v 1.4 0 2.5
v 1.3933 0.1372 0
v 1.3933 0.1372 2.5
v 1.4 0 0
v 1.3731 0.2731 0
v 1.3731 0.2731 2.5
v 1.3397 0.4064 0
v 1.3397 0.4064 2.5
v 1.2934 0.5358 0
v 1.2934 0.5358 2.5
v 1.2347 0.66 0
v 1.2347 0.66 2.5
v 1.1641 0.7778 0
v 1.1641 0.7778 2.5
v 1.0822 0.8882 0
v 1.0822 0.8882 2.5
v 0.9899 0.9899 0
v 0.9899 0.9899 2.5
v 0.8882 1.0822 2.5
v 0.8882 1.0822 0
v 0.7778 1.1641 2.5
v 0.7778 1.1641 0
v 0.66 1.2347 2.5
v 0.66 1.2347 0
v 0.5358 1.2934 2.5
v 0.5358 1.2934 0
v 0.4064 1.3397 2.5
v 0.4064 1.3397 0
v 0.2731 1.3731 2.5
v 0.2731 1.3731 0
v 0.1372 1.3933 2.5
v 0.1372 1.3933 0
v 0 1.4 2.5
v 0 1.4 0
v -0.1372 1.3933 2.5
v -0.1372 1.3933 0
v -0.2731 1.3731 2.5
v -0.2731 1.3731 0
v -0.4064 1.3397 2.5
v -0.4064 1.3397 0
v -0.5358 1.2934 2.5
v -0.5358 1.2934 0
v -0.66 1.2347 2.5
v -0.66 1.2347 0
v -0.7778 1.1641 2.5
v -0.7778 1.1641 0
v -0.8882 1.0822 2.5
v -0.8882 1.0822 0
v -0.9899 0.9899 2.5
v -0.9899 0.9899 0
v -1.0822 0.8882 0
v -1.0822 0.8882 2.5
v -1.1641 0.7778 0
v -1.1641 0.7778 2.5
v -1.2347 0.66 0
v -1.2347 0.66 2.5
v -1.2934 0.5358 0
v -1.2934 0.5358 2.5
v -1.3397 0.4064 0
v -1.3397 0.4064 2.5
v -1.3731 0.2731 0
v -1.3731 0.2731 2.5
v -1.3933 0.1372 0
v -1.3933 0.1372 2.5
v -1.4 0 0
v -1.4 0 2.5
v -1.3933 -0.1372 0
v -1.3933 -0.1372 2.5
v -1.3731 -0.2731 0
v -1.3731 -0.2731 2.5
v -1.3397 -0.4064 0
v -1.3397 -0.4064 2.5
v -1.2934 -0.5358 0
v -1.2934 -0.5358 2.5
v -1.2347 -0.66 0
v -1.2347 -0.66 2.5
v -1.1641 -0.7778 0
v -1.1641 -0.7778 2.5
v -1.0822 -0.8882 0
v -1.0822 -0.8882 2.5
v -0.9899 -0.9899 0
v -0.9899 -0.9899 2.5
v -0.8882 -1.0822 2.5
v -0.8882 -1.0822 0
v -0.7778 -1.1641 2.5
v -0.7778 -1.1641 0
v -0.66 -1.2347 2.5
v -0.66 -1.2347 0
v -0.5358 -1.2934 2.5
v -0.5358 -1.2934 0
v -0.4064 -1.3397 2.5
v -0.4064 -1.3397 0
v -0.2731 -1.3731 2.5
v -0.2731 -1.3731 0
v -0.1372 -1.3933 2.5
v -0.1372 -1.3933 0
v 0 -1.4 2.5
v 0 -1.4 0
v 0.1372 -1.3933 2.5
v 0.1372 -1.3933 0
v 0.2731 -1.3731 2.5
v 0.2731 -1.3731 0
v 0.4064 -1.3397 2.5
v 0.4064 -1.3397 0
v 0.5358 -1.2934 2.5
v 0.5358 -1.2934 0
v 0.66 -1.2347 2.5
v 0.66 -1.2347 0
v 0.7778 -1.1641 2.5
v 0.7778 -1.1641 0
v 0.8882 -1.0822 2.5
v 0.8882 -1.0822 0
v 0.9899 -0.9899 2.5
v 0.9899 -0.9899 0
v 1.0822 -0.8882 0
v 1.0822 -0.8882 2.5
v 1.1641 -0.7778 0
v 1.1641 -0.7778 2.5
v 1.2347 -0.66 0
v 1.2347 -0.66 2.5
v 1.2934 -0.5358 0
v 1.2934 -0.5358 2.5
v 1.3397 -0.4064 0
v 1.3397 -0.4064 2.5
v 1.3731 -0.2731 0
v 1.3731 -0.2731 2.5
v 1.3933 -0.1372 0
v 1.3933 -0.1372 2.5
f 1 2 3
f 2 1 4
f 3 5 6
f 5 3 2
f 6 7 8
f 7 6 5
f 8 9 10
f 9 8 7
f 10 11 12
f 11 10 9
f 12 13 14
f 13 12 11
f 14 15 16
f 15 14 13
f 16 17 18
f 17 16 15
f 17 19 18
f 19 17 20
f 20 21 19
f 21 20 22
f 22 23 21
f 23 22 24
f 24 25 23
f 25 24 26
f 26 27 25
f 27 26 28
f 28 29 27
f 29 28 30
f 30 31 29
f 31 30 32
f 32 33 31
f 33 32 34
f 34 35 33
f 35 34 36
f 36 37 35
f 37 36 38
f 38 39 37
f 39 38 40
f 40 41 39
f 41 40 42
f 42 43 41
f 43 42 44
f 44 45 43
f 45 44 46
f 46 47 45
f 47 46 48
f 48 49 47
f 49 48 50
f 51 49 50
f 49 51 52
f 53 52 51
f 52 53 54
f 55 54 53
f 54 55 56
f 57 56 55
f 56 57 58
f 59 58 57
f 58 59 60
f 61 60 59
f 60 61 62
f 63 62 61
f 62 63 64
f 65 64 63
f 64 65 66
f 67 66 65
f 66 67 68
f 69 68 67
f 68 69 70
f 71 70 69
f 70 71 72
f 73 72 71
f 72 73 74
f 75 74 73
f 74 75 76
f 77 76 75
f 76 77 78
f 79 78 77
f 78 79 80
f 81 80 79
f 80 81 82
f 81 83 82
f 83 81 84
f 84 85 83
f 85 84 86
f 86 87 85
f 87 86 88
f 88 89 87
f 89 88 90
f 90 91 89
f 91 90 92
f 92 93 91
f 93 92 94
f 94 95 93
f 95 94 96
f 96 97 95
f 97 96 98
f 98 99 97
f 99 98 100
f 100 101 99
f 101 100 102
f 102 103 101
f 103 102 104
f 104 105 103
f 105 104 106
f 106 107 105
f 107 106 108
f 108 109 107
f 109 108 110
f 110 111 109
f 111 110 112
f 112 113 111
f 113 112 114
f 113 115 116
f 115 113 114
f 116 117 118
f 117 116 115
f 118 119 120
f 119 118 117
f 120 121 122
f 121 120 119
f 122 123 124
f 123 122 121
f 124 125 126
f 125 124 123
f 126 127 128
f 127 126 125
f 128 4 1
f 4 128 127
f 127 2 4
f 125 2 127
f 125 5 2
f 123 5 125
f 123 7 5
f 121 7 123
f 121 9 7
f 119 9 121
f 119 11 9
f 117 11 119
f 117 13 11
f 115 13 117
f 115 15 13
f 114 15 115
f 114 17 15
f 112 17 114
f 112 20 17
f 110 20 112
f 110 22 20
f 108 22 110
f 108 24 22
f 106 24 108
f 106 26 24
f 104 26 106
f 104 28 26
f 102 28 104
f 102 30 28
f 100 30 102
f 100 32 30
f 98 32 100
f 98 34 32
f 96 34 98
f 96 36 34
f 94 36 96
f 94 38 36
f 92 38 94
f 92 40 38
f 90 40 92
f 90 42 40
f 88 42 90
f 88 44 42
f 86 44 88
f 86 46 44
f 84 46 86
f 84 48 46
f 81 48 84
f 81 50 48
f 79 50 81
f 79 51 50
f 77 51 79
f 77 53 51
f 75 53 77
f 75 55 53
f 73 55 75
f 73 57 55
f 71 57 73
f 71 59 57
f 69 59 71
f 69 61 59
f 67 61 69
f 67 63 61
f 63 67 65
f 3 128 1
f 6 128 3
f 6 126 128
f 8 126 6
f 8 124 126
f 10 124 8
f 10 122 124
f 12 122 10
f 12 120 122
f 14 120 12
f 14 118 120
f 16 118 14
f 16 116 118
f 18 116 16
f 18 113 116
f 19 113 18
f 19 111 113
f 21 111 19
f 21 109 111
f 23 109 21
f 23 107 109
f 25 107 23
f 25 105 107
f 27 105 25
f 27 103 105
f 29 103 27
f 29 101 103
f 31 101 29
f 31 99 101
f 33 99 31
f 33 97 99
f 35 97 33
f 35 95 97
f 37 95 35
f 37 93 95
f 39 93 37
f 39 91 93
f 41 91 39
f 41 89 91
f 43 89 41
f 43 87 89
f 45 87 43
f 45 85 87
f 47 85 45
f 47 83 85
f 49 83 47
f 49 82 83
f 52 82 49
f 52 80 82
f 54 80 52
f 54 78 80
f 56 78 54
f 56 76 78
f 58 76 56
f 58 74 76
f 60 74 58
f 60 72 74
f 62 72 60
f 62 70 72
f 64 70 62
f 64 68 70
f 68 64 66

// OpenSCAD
// difference() {
//   intersection() {
//     import("MainBody1_fixed.stl");
//     //translate([0,-10,-80]) cube([45,16.5,80]);
//    //   translate([0,-10,-65]) cube([45,16.5,50]);
//   }
//   translate([33,-2.5,-60]) cube([10,5,28]);
//   translate([20,-3.5,-42]) cube([15,5,10]);
//   translate([18,-3.5,-43]) rotate([0,30,0]) cube([20,5,10]);
//   translate([6.5,-1,-38]) {
//     cube([15.5,20,12]);
//     translate([7.75,0,0]) rotate([-90,0,0]) cylinder(r=7.75,h=20);
//   }
// }
// translate([13.7,0,-31.2]) rotate([-90,0,0]) translate([11.6,12,0]) cylinder(r=1.4,h=5,$fn=64);
// translate([26,0,-44]) rotate([-90,0,0]) translate([11.6,12,0]) cylinder(r=1.4,h=5,$fn=64);
// translate([24,0,-35]) rotate([-90,0,0]) translate([11.6,12,0]) cylinder(r=1.4,h=5,$fn=64);


cylinder(r=1.4,h=2.5,$fn=64);
//translate([13.7,-2.5,-31.2]) rotate([-90,0,0]) trigger();
  //trigger();
 // translate([10,0,0]) cube([20,50,10]);
 // translate([20,-5,-48]) cube([30,10,40]);
// ;

module trigger() {
  
  color("red") 
  translate([11.6,12,0]) 
 // rotate([0,0,25])
  //rotate([0,0,-8]) 
  translate([-11.6,-12,0]) difference() {
    translate([1.6,-1,0]) {
      cylinder(r=12,h=2.5,$fn=64);
      translate([1,4.5,0]) cube([22,6,2.5]);
      translate([10,13,0]) {
        difference() {
          union() {
            cylinder(r=3,h=2.5,$fn=64);
            translate([-3,-3,0]) cube([6,3,2.5]);
          }
          translate([0,0,-1]) cylinder(r=1.5,h=10,$fn=64);
        }
      }
      translate([23,7.5,0]) cylinder(r=3,h=2.5,$fn=64);
    }
    translate([0,0,-1]) cylinder(r=8,h=10,$fn=64);
    
    translate([25,6.6,-1]) cylinder(r=1.5,h=10,$fn=64);
    translate([22,3,0.75]) cube([10,7,1]);


    rotate([0,0,-45]) translate([-11,-19.2,-1]) cube([30,20,10]);
    translate([-15,-16.5,-1]) cube([30,20,10]);

  }
}
